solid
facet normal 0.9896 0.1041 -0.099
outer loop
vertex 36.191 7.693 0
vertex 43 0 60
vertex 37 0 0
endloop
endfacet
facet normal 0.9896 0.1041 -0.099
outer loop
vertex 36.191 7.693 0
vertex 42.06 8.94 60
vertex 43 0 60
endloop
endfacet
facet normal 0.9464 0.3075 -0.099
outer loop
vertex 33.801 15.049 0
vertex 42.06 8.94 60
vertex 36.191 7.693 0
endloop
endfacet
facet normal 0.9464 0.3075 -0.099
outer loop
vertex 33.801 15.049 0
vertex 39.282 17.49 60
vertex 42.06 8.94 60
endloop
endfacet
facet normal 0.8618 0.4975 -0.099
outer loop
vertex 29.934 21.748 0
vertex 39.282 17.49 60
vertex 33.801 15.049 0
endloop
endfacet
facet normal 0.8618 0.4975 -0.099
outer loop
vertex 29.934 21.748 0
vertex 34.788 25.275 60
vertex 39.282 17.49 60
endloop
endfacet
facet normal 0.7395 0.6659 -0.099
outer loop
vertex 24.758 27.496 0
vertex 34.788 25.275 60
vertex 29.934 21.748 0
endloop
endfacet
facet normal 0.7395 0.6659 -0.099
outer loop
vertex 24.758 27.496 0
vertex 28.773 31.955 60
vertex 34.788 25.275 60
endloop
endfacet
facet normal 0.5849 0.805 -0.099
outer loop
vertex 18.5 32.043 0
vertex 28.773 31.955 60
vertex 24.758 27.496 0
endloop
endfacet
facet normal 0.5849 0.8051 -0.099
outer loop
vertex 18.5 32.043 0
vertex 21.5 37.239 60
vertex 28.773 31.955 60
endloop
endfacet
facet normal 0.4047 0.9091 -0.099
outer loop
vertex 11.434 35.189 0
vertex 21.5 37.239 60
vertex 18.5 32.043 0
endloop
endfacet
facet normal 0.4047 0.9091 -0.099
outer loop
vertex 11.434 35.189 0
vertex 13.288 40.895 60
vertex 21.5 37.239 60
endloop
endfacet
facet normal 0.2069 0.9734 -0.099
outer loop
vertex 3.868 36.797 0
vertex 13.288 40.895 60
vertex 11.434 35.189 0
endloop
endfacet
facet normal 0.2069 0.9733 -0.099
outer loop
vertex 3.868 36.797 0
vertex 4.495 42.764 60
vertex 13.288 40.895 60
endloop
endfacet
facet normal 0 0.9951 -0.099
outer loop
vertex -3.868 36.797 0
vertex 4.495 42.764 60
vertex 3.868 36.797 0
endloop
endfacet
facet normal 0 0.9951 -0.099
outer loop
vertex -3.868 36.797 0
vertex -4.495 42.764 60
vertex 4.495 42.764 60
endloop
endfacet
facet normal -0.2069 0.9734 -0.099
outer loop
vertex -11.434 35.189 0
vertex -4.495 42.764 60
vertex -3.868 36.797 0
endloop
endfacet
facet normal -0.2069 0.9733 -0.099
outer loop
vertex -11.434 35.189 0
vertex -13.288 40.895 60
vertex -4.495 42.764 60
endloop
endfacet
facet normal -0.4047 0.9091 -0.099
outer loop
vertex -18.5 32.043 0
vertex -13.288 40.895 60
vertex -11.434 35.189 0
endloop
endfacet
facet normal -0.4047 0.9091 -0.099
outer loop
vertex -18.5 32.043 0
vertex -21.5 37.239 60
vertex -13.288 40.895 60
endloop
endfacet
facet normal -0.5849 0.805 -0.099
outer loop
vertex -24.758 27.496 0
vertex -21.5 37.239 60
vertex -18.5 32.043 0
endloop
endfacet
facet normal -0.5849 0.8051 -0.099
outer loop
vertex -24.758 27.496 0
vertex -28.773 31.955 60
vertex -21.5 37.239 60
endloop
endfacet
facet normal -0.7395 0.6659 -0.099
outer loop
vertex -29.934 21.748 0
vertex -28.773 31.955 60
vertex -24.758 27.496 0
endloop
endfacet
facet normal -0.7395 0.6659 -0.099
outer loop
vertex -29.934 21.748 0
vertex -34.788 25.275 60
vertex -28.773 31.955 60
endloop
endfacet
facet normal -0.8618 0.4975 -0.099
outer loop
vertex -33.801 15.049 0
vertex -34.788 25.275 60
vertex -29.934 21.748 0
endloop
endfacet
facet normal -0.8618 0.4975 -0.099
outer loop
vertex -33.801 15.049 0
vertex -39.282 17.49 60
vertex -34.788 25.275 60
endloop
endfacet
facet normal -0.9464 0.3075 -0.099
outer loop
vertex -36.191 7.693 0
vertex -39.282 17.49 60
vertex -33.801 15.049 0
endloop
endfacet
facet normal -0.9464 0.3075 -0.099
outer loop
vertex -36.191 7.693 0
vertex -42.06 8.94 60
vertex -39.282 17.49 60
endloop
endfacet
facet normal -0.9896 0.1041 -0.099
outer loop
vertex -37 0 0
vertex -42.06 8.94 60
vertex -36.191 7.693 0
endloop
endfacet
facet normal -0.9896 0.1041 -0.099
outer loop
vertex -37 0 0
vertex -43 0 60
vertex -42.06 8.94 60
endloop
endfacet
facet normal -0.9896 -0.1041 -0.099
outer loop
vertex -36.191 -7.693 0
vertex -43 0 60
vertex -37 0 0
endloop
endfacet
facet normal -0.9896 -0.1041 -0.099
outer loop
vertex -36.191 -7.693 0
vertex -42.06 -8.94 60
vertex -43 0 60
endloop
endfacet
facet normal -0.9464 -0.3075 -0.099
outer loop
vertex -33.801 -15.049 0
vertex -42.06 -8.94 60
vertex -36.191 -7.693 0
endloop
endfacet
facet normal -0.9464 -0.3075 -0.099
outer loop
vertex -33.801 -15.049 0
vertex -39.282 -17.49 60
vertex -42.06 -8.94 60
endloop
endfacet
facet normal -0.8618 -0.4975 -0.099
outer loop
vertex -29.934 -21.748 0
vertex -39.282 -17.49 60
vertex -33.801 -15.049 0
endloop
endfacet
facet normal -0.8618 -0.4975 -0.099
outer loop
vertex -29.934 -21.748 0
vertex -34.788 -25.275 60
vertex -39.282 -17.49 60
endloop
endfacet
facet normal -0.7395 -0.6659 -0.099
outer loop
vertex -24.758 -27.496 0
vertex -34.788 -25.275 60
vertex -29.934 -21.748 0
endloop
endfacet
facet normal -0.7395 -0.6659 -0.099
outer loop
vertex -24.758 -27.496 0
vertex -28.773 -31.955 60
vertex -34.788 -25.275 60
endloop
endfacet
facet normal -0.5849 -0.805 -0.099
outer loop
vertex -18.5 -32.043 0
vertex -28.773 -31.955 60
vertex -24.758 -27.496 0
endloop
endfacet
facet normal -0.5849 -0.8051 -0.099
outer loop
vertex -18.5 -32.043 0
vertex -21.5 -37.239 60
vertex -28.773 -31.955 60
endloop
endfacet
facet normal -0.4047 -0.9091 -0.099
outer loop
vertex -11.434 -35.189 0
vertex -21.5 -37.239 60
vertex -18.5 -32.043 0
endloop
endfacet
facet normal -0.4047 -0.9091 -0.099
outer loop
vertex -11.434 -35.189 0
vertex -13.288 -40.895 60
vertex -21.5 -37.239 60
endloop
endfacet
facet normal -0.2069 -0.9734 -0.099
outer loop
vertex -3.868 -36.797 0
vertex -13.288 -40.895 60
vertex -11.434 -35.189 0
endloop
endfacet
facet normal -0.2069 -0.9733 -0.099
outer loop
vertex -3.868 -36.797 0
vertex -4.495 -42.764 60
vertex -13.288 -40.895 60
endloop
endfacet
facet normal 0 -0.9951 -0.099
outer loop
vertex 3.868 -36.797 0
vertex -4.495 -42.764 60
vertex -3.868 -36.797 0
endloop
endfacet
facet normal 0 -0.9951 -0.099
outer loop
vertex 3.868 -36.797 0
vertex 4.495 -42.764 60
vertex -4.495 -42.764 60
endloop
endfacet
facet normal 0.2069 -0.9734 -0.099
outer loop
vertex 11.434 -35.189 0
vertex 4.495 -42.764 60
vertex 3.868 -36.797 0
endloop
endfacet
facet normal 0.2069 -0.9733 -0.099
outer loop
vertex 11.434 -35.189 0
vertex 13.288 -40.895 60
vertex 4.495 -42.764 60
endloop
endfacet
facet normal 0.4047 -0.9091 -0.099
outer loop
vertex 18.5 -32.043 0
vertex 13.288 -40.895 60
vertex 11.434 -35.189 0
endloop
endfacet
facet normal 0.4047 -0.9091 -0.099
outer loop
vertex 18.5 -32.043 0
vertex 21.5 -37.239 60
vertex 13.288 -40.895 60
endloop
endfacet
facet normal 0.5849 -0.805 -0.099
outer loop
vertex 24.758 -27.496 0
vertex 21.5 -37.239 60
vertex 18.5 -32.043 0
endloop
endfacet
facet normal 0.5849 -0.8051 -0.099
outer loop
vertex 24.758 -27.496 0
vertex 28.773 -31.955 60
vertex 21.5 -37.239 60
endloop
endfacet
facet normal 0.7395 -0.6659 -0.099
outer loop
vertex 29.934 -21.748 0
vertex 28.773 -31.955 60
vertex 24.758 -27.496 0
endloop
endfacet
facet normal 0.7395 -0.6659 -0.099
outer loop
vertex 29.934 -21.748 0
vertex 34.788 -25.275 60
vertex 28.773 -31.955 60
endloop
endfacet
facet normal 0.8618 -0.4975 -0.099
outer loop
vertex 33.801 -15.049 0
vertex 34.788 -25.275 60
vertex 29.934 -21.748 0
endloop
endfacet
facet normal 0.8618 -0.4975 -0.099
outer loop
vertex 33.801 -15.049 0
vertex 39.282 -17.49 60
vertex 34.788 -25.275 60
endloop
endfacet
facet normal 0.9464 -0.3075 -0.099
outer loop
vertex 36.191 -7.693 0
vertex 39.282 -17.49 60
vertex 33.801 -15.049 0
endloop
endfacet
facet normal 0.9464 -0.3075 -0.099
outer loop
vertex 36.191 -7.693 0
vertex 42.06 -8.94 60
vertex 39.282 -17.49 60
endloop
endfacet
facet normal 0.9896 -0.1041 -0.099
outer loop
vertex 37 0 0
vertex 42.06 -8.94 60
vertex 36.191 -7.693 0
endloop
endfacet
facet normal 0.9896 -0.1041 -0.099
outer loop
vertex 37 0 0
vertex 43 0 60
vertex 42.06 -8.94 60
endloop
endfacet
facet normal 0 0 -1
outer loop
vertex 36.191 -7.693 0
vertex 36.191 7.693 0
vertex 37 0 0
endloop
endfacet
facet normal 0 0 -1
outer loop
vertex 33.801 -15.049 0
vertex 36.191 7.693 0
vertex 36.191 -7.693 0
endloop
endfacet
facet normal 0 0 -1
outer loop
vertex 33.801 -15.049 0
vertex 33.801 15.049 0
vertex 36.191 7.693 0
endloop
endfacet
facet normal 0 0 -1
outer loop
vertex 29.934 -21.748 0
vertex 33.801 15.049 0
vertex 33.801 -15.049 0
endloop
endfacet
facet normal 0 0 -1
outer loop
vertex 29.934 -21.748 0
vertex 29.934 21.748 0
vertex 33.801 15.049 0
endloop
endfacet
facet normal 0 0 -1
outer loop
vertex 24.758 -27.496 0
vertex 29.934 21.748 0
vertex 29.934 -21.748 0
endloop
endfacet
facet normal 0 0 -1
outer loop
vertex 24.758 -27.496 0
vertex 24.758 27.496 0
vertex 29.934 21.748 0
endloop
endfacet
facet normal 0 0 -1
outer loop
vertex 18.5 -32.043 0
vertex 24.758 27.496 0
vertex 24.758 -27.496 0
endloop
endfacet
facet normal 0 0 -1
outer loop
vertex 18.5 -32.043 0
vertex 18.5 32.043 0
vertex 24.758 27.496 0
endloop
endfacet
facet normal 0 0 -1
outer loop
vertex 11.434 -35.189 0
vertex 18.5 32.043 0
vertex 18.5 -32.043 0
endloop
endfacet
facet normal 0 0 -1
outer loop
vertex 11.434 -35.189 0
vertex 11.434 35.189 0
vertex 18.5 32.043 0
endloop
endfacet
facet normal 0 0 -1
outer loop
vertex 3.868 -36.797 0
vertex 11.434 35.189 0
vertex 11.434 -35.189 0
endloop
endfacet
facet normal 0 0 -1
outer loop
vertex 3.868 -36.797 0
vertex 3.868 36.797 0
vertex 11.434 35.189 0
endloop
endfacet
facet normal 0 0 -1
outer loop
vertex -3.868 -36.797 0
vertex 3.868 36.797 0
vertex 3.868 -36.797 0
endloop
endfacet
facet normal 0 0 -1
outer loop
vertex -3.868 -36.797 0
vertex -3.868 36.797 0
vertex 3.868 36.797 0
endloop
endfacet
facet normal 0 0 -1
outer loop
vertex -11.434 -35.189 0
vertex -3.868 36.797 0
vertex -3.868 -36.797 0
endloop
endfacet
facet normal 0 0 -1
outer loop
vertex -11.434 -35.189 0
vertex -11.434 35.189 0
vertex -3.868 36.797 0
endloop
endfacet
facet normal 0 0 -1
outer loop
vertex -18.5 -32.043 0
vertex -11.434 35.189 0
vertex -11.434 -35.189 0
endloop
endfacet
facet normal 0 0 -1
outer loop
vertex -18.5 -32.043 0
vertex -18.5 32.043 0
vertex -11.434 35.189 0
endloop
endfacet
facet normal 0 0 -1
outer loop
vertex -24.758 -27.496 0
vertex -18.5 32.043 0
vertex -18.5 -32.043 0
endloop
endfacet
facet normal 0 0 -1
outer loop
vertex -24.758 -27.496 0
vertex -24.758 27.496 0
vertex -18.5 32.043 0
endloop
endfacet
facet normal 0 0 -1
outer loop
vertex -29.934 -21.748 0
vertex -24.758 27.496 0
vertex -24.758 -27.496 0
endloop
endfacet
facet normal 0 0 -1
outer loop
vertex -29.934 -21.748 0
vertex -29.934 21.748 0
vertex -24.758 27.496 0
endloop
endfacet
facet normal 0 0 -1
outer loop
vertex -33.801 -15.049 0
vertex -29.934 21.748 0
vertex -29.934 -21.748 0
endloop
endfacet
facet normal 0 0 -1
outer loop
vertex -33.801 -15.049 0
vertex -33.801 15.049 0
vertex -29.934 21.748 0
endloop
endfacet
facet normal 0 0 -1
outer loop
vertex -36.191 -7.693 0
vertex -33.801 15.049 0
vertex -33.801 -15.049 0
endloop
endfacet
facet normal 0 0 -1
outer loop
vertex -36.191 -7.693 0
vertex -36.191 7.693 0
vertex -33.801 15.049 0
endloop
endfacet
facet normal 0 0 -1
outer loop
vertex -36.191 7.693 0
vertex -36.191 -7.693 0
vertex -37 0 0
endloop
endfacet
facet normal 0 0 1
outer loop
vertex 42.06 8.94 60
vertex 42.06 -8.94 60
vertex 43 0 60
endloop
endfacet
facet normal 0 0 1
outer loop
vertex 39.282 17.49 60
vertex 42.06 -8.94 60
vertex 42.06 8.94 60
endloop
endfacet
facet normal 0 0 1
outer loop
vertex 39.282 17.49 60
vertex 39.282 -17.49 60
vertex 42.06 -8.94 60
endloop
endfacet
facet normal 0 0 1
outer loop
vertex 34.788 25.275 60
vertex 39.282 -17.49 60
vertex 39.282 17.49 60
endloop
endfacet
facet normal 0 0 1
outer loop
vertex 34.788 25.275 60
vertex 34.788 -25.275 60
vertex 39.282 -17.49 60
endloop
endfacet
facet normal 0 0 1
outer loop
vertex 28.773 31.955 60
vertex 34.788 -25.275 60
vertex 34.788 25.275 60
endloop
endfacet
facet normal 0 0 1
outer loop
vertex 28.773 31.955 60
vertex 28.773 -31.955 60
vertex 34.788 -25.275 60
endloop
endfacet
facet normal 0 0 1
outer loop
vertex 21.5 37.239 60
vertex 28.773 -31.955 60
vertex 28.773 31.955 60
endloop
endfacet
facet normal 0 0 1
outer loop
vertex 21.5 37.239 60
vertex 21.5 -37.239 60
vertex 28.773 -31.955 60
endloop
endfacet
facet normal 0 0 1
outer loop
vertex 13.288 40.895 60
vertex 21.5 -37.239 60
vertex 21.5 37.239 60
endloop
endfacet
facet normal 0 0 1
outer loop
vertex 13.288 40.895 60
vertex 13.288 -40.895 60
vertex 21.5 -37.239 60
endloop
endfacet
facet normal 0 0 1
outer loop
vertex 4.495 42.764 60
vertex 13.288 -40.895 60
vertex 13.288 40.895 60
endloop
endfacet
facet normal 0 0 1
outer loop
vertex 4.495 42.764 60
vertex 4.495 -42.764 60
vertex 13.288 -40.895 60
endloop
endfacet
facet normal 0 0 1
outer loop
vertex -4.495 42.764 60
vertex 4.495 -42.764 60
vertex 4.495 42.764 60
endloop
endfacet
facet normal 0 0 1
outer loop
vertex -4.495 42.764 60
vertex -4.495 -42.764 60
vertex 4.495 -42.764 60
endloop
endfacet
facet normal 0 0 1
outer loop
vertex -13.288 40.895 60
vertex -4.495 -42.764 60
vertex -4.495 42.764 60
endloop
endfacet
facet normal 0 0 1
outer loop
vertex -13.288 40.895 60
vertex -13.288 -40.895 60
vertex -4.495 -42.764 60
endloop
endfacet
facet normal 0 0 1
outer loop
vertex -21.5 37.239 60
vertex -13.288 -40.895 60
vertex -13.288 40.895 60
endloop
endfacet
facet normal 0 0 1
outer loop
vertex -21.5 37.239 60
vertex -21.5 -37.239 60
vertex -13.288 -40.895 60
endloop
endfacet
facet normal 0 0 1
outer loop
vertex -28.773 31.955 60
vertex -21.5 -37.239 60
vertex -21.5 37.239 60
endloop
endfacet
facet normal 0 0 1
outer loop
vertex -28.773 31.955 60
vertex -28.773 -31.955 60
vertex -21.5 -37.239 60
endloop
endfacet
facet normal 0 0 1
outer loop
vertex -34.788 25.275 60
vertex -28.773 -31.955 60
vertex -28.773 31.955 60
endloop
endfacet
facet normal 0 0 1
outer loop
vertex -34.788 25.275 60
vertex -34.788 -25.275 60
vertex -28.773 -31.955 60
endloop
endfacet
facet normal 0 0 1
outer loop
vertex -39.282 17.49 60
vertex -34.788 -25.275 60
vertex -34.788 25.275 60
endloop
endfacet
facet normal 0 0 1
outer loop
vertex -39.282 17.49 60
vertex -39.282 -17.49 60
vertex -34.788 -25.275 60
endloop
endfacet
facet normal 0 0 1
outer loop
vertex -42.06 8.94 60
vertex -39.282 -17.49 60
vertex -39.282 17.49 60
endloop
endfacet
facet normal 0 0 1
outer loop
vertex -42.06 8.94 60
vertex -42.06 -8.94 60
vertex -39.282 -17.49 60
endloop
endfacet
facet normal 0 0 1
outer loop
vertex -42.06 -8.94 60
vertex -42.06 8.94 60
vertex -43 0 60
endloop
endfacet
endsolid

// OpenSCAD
// Cup holder dock for a 2012 Jeep Wrangler	

// Parameters
topDiameter = 86;
bottomDiameter = 74;
depth = 60;


// Do not touch
topRadius = topDiameter/2;
bottomRadius = bottomDiameter/2;


module baseCylinder() {
	translate(v=[0,0,depth/2]) cylinder(h = depth, r2 = topRadius, r1 = bottomRadius,center = true);
}

baseCylinder();
